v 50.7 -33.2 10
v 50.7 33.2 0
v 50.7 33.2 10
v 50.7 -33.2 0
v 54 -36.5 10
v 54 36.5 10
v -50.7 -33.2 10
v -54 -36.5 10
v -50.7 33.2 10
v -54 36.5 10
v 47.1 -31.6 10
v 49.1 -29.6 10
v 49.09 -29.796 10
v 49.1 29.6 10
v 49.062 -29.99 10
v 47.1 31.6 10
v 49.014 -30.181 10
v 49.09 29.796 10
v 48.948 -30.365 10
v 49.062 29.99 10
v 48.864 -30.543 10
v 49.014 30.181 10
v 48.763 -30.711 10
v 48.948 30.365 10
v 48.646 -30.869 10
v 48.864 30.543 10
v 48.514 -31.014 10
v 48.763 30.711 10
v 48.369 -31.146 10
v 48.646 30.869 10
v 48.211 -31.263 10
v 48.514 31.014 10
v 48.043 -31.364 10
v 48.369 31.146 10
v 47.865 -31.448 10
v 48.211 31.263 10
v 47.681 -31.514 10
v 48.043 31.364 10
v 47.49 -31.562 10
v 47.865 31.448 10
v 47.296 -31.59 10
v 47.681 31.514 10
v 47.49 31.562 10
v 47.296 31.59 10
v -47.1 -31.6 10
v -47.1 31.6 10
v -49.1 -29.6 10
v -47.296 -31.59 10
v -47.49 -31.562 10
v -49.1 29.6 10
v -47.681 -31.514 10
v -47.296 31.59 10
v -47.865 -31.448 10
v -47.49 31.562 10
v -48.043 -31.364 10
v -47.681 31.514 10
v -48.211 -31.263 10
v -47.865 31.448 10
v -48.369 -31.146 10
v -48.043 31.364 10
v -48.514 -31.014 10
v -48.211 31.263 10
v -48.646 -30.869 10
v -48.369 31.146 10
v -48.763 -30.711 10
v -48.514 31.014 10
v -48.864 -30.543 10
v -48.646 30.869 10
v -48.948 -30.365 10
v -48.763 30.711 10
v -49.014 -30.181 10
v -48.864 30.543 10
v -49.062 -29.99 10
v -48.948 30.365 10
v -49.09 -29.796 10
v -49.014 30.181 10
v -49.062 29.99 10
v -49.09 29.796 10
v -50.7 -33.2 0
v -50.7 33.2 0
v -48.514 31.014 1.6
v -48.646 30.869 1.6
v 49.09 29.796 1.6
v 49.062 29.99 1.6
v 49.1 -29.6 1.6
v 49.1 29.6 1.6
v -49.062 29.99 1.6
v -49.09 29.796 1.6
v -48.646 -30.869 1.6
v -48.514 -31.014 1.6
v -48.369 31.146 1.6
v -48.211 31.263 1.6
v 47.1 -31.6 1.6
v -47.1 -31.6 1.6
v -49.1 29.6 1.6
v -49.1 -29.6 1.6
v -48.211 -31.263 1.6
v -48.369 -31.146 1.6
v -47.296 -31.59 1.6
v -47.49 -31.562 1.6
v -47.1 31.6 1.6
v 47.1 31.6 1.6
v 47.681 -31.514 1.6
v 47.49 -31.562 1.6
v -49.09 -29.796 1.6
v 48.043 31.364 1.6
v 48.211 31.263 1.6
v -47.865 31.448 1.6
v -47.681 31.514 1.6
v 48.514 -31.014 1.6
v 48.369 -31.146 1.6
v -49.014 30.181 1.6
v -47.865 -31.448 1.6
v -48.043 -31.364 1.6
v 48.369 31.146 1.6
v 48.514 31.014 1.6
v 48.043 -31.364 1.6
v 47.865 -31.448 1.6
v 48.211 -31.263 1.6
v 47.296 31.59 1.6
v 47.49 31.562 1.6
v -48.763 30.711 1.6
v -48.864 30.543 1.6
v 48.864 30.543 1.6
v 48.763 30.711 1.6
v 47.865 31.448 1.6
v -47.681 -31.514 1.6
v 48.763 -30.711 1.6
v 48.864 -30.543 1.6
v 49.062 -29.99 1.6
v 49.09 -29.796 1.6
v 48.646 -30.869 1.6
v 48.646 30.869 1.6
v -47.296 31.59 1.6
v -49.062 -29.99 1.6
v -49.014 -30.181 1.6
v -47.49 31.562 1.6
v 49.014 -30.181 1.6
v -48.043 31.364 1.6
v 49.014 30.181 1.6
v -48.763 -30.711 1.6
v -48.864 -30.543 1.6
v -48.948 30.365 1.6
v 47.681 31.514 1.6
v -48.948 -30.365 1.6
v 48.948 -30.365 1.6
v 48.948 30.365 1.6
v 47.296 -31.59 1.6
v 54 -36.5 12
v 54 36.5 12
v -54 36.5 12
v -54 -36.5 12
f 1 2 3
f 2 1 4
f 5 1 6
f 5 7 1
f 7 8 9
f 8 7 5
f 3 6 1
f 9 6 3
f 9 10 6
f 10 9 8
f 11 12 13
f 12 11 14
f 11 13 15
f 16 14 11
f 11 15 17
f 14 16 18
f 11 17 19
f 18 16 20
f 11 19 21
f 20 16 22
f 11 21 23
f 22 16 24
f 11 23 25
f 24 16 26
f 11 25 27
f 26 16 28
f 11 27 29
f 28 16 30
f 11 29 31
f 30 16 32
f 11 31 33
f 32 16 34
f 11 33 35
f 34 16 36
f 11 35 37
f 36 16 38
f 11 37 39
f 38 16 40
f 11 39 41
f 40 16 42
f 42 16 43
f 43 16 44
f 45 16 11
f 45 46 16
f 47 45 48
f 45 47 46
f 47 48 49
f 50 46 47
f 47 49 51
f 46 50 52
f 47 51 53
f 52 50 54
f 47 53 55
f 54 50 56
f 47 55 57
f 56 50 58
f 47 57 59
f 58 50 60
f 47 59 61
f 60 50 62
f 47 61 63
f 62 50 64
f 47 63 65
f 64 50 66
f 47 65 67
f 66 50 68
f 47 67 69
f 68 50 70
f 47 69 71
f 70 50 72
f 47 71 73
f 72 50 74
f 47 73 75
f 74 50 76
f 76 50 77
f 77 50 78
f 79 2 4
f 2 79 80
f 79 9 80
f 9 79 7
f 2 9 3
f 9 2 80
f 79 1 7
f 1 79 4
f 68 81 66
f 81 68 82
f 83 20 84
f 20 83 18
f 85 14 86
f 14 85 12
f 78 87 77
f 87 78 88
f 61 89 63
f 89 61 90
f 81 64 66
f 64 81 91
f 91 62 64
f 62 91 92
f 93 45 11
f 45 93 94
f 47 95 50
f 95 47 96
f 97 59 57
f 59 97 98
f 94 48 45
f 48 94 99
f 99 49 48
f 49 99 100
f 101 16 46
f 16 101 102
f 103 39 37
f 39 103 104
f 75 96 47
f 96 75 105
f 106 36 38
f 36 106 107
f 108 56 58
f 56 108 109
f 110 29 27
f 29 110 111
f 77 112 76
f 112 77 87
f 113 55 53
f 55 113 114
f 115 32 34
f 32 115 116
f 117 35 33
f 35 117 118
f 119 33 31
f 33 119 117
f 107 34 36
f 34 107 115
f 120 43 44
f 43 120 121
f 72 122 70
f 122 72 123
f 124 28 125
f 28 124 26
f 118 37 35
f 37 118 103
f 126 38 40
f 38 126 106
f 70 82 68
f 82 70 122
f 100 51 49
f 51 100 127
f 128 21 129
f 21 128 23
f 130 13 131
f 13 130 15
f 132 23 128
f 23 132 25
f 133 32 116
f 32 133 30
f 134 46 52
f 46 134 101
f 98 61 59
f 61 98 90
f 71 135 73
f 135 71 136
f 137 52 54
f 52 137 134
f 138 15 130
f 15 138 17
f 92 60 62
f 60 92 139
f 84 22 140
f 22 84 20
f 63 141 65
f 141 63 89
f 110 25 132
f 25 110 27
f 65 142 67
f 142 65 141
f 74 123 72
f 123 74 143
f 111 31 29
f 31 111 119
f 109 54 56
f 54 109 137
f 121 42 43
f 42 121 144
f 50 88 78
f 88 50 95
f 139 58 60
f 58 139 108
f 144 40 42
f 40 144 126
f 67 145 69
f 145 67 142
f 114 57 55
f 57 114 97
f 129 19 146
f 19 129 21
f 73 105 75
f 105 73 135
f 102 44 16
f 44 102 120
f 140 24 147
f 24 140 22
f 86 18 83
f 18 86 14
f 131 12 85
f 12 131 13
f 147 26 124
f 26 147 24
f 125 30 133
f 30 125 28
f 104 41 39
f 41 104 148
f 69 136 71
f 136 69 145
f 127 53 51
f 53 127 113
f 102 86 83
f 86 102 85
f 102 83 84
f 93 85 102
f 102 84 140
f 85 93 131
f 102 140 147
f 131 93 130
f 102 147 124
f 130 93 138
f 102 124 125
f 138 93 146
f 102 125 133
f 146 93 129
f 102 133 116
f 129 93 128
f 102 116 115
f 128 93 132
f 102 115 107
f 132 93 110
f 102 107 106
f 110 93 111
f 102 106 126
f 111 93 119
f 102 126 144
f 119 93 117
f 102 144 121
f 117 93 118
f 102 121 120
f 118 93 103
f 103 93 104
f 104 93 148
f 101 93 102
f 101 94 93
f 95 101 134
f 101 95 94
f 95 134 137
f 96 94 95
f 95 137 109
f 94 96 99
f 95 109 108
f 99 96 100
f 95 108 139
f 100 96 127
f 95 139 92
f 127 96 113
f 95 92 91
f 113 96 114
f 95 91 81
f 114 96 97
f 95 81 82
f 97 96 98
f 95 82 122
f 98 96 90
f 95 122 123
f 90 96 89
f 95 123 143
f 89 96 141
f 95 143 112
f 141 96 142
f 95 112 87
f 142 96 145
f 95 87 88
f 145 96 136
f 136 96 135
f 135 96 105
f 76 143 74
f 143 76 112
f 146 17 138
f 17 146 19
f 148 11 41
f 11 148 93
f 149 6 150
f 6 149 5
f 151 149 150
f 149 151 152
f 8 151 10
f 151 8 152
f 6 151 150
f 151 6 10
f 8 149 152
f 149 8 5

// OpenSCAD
// seifenschale — wandmontierte 3D-druckbare Seifenschale
// Spec: docs/superpowers/specs/2026-05-10-seifenschale-design.md

// --- Customizer ---
mode = "assembled";  // [assembled, explosion, print]
part = "all";        // [all, wandhalterung, schale, gitter]
$fn = 64;

// --- Geometry constants (mm) ---

// Wandhalterung
wandplatte_x = 30;
wandplatte_y = 3;
wandplatte_z = 60;

steg_x = 12;
steg_y = 20;
steg_z = 12;

rahmen_x = 110;
rahmen_y = 75;
rahmen_z = 12;
rahmen_wand = 4;

// Powerstrip (informational — geometry has no recess)
powerstrip_kleb_x = 50;
powerstrip_kleb_y = 20;

// Tolerances
clearance_schale = 0.3;
clearance_gitter = 0.3;

// Schale
rahmen_innen_x = rahmen_x - 2 * rahmen_wand;             // 102
rahmen_innen_y = rahmen_y - 2 * rahmen_wand;             // 67
schale_koerper_x = rahmen_innen_x - 2 * clearance_schale; // 101.4
schale_koerper_y = rahmen_innen_y - 2 * clearance_schale; // 66.4
schale_krempe_ueberlapp = 3;
schale_krempe_x = rahmen_innen_x + 2 * schale_krempe_ueberlapp; // 108
schale_krempe_y = rahmen_innen_y + 2 * schale_krempe_ueberlapp; // 73
schale_krempe_dick = 2;
schale_tief = 10;
schale_wand = 1.6;
schale_boden = 1.6;
schale_innen_radius = 2;
schale_innen_x = schale_koerper_x - 2 * schale_wand;  // 98.2
schale_innen_y = schale_koerper_y - 2 * schale_wand;  // 63.2

// Gitter
gitter_x = schale_innen_x - 2 * clearance_gitter;     // 97.6
gitter_y = schale_innen_y - 2 * clearance_gitter;     // 62.6
gitter_stab_breit = 4;
gitter_stab_hoch = 4;
gitter_fuss_hoch = 2;
gitter_quer_hoch = 1.6;          // Höhe der Querverbinder oben
gitter_total_hoch = gitter_fuss_hoch + gitter_stab_hoch;  // 6

// --- Module: Wandhalterung ---
// Origin: center of rear edge of frame, z=0.
// Frame extends +Y, Steg and Wandplatte extend -Y.
module wandhalterung() {
    // Rahmen: hollow vertical chimney, 4 walls
    difference() {
        translate([-rahmen_x / 2, 0, 0])
            cube([rahmen_x, rahmen_y, rahmen_z]);
        translate([
            -rahmen_x / 2 + rahmen_wand,
            rahmen_wand,
            -0.1
        ])
            cube([
                rahmen_x - 2 * rahmen_wand,
                rahmen_y - 2 * rahmen_wand,
                rahmen_z + 0.2
            ]);
    }

    // Steg: solid block from rear edge of frame backward to wall plate
    translate([-steg_x / 2, -steg_y, 0])
        cube([steg_x, steg_y, steg_z]);

    // Wandplatte: thin plate at the back, rises from z=0 to z=wandplatte_z
    translate([-wandplatte_x / 2, -steg_y - wandplatte_y, 0])
        cube([wandplatte_x, wandplatte_y, wandplatte_z]);
}

// --- Module: Schale ---
// Origin: center of dish in X/Y, z=0 = outside bottom of dish.
// Krempe (rim) sits at z = schale_tief.
module schale() {
    // Body (outer) minus inner cavity with rounded inner corners
    difference() {
        translate([-schale_koerper_x / 2, -schale_koerper_y / 2, 0])
            cube([schale_koerper_x, schale_koerper_y, schale_tief]);
        schalen_innenraum();
    }
    // Krempe (rim)
    translate([-schale_krempe_x / 2, -schale_krempe_y / 2, schale_tief])
        cube([schale_krempe_x, schale_krempe_y, schale_krempe_dick]);
}

module schalen_innenraum() {
    r = schale_innen_radius;
    inner_x = schale_koerper_x - 2 * schale_wand;
    inner_y = schale_koerper_y - 2 * schale_wand;
    inner_z = schale_tief - schale_boden + 0.1;
    translate([0, 0, schale_boden])
        hull() {
            for (sx = [-1, 1], sy = [-1, 1])
                translate([
                    sx * (inner_x / 2 - r),
                    sy * (inner_y / 2 - r),
                    0
                ])
                    cylinder(h=inner_z, r=r);
        }
}

// --- temporary preview (Task 4) ---
schale();
